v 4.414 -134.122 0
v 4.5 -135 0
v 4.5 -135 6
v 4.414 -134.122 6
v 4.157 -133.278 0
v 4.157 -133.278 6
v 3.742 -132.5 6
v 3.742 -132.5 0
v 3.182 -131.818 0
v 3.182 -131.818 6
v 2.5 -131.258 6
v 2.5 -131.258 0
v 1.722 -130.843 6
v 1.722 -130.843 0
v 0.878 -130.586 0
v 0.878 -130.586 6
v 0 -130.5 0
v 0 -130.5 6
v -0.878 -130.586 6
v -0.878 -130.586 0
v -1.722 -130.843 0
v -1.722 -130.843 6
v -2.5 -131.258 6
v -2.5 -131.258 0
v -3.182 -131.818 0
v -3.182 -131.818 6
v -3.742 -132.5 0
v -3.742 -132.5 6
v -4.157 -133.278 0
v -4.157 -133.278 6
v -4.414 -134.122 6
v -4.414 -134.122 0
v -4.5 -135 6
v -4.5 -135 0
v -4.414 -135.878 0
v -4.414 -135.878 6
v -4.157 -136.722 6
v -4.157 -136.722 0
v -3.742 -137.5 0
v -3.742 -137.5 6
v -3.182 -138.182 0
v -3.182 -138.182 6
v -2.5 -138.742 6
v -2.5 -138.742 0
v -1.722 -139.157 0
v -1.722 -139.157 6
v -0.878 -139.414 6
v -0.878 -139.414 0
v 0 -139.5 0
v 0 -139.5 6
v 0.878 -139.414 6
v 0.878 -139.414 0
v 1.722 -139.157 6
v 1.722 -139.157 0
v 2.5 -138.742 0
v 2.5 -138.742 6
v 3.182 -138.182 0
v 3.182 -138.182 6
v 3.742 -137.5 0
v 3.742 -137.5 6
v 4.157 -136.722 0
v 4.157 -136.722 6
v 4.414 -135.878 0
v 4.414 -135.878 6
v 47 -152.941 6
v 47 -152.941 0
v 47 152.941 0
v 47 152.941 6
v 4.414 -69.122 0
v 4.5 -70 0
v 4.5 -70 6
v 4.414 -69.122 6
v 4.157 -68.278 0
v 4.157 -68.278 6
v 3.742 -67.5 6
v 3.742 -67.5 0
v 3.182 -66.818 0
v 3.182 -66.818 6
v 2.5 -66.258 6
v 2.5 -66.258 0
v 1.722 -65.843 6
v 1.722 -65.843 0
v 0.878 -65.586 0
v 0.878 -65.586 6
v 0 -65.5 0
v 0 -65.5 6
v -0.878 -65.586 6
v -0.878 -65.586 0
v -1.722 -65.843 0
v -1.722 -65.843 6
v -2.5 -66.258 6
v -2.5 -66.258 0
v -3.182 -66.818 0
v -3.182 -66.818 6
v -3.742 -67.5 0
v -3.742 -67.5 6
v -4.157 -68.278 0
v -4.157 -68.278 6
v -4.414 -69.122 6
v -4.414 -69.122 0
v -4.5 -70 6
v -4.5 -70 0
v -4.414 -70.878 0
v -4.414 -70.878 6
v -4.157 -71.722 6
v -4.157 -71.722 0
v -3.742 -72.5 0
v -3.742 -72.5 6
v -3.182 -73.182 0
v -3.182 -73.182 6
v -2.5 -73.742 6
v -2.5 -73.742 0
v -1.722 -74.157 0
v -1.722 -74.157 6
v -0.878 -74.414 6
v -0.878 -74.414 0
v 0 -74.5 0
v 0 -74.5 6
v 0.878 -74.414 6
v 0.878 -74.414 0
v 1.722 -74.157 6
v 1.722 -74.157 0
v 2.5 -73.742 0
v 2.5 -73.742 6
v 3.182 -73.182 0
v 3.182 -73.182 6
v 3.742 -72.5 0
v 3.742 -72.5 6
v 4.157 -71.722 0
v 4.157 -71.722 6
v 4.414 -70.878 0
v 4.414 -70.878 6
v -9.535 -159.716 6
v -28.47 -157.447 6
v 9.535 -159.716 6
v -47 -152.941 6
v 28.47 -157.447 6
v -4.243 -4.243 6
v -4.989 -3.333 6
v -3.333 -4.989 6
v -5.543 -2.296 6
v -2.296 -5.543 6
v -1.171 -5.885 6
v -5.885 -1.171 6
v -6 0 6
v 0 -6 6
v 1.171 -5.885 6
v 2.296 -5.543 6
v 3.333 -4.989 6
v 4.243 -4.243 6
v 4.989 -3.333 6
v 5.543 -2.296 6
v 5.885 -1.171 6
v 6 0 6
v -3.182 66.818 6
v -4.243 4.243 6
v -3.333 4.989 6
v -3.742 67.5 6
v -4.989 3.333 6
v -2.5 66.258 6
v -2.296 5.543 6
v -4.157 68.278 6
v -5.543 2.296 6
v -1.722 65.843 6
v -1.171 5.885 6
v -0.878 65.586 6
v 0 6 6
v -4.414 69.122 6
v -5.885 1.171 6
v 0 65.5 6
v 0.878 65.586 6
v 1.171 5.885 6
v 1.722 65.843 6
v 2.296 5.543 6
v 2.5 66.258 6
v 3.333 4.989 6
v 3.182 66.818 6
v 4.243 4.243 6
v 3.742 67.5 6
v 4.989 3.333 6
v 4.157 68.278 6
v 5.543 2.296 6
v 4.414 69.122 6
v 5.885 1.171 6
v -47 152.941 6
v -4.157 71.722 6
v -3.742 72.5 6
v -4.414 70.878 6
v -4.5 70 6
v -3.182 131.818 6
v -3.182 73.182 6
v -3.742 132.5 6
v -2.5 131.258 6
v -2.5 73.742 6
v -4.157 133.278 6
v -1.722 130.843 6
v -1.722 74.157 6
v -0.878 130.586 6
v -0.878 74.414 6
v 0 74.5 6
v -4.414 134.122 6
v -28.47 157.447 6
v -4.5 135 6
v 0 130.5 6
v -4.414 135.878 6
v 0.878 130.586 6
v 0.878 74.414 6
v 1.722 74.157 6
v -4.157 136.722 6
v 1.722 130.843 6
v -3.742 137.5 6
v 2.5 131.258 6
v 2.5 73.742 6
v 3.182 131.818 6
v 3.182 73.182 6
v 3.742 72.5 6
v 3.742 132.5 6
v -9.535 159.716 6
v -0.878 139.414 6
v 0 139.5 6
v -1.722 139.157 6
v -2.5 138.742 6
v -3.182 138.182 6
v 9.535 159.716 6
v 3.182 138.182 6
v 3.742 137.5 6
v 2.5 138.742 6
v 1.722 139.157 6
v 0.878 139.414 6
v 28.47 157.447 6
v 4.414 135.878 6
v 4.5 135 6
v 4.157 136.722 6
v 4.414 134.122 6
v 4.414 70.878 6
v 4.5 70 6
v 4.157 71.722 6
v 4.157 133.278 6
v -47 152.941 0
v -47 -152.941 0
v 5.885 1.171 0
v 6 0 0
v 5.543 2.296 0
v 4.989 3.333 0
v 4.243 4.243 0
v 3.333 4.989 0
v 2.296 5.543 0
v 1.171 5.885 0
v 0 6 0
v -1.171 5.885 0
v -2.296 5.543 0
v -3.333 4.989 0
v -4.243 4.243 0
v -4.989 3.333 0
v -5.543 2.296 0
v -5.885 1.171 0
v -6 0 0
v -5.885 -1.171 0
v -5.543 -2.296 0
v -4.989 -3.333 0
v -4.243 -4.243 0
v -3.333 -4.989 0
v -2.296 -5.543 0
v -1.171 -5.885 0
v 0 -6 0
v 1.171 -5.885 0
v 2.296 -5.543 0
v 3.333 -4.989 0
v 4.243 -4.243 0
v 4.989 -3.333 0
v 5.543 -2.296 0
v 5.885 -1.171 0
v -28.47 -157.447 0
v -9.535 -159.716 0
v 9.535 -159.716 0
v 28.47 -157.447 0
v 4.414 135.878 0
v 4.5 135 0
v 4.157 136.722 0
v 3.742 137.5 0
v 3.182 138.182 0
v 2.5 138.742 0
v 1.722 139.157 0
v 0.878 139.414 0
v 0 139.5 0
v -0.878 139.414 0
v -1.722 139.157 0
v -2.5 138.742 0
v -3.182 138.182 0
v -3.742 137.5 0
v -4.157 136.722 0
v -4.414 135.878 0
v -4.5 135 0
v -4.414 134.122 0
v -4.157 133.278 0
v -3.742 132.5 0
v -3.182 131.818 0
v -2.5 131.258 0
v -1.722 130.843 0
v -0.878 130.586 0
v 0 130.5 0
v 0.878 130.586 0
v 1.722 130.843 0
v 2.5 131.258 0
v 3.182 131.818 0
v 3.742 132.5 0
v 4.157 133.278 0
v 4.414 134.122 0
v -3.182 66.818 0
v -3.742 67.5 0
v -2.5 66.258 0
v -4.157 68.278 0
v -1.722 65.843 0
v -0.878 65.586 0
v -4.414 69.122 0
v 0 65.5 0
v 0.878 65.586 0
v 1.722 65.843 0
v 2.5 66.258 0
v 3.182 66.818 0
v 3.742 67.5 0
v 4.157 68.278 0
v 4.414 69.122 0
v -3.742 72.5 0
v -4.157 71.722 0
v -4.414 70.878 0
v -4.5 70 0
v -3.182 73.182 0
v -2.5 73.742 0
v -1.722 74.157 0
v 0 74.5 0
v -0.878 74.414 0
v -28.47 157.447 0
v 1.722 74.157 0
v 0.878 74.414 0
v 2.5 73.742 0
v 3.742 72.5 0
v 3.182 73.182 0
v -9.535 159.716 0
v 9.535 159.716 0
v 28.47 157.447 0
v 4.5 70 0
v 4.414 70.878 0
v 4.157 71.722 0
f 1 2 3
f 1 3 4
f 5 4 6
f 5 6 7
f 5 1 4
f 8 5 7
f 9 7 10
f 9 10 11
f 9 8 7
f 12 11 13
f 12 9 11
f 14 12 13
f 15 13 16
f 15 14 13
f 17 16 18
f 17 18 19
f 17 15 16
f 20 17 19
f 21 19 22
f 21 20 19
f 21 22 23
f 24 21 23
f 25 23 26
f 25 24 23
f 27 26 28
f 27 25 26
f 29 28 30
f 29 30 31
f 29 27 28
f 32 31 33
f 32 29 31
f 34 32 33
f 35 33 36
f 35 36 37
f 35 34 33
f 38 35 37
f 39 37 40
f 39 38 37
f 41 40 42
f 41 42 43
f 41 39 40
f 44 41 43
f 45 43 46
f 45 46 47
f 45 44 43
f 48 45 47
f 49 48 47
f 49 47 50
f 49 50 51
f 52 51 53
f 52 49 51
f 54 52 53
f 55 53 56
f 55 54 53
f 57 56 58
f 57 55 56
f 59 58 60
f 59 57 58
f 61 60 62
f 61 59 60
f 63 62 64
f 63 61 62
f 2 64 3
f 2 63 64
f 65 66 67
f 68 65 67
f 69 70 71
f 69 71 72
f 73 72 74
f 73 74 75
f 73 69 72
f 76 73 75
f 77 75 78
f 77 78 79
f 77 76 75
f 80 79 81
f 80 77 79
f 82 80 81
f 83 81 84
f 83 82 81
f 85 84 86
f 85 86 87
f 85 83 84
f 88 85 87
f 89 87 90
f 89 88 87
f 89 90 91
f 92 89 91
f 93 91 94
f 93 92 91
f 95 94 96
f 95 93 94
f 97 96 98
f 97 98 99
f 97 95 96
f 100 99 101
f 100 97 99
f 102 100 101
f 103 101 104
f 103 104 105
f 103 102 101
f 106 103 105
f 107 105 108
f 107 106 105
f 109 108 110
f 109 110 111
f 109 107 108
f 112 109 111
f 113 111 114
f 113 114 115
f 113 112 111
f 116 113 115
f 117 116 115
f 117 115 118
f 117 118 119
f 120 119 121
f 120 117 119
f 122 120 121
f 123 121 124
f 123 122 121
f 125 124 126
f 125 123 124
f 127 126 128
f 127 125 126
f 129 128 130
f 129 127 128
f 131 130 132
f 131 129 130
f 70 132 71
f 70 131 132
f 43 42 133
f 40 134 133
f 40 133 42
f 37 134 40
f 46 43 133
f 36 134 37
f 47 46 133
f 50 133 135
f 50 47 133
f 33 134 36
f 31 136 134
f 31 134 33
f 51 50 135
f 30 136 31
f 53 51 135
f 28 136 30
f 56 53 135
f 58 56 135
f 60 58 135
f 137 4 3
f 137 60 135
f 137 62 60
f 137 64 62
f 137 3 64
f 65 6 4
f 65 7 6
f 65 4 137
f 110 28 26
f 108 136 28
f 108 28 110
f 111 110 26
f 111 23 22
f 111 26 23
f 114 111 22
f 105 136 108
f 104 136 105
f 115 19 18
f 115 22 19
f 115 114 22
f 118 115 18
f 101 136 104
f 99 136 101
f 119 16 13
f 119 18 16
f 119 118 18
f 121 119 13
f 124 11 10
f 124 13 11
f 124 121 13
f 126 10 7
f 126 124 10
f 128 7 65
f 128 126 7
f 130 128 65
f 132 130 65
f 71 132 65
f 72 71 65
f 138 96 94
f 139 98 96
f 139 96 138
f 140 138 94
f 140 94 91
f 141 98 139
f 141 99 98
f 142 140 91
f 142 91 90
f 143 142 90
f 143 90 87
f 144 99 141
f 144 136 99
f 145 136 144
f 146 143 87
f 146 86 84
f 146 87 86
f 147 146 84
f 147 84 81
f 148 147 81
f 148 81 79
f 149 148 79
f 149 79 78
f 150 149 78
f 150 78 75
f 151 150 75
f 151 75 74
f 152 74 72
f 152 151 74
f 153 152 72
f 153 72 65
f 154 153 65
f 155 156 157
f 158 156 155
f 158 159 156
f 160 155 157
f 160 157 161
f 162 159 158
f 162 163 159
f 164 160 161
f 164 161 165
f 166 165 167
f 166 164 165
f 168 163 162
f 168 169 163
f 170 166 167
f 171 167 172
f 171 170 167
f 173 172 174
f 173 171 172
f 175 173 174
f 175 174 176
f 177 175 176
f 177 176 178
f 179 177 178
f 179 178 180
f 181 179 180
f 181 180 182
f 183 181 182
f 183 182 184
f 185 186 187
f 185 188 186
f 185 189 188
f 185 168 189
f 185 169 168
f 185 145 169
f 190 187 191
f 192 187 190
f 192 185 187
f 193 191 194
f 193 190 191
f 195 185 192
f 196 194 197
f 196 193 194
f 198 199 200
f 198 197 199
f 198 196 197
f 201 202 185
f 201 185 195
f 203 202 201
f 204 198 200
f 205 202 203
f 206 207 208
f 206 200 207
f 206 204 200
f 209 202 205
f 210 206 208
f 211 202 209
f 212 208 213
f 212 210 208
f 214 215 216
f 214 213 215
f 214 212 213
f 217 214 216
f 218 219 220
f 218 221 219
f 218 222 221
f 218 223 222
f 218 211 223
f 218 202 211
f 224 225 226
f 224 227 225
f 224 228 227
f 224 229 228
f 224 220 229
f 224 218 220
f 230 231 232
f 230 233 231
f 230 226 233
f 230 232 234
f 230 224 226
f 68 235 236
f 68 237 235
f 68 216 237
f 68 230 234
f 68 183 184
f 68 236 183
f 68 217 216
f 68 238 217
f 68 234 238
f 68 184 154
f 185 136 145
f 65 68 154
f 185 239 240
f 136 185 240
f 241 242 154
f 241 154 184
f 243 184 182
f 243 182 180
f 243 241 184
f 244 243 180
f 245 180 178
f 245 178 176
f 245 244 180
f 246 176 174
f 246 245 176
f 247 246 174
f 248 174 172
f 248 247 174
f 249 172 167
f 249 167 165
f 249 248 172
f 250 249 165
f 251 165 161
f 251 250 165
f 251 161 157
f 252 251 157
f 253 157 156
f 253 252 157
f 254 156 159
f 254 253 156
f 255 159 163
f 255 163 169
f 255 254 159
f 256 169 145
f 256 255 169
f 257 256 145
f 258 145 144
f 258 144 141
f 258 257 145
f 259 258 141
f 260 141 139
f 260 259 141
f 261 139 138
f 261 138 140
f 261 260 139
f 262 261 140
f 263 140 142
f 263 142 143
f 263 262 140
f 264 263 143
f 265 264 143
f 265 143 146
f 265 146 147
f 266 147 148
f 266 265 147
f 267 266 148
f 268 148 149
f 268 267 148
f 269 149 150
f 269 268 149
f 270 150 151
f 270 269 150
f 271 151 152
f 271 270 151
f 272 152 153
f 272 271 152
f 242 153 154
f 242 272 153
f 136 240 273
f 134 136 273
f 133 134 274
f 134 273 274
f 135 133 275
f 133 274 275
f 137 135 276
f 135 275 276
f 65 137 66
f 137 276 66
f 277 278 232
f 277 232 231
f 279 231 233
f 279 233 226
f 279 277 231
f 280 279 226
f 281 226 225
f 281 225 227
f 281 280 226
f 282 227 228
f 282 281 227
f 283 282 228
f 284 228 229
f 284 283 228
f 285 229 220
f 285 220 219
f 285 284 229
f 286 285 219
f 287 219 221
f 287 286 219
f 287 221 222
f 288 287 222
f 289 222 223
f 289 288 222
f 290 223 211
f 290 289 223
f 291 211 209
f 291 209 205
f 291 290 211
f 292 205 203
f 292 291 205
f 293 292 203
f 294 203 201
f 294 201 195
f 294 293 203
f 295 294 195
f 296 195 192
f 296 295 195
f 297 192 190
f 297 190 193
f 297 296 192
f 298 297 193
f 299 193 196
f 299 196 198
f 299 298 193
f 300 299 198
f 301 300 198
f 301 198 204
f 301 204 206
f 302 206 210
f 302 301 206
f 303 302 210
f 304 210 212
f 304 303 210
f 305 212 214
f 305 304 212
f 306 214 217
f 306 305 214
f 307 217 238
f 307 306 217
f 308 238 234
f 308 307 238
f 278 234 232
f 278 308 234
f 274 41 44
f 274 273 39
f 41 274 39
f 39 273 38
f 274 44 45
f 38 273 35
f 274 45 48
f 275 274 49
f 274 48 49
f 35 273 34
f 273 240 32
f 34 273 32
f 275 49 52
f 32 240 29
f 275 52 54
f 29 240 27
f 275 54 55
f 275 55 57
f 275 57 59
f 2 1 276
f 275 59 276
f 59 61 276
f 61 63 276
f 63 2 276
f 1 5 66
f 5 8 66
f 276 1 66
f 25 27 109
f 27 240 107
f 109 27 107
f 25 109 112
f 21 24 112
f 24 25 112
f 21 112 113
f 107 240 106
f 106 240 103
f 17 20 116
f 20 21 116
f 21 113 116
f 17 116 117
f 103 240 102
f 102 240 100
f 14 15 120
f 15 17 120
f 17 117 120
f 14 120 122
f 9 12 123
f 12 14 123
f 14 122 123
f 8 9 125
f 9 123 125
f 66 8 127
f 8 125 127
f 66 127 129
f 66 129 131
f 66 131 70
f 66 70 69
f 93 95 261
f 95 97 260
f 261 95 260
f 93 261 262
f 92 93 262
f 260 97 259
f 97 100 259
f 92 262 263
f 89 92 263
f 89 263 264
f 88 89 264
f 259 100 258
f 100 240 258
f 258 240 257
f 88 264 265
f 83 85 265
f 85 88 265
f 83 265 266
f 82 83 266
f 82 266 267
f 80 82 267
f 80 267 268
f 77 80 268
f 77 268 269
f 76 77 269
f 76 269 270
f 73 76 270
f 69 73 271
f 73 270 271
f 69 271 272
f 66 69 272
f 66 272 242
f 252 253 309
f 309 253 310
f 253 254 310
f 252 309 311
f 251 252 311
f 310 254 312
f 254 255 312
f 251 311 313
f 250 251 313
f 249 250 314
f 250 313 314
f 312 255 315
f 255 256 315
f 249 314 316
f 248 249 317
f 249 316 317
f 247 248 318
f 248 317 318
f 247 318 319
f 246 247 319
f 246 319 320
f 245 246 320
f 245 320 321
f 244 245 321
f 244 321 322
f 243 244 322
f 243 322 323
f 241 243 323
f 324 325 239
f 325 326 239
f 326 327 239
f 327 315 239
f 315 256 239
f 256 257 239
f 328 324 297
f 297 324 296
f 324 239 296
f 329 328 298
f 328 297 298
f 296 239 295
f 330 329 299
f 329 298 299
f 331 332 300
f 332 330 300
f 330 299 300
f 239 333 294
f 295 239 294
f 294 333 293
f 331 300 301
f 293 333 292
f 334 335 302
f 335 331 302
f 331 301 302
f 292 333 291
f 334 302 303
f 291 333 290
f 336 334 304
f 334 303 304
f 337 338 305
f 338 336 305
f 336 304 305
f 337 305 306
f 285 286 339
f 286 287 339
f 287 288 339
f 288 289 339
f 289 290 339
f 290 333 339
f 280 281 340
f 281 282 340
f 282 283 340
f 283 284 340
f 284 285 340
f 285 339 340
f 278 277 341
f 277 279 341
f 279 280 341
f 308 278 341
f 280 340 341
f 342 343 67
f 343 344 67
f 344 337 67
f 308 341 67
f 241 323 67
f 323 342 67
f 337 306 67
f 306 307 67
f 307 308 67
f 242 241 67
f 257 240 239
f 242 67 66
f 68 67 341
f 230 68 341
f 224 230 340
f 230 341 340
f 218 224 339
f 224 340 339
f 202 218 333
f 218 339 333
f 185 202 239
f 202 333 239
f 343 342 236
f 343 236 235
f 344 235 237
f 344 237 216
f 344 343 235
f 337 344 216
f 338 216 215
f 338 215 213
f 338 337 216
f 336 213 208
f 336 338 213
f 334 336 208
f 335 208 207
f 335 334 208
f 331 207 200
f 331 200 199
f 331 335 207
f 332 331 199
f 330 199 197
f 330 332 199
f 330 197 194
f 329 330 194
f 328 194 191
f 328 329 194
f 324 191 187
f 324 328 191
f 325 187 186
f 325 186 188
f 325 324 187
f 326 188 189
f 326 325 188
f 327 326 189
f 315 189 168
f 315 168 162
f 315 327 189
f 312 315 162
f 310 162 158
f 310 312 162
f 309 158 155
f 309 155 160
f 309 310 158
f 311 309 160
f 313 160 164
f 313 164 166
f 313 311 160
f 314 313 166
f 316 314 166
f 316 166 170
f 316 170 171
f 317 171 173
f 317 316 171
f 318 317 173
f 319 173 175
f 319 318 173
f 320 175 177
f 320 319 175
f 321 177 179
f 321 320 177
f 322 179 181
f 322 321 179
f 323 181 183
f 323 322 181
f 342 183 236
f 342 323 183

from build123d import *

# Parameters (mm, degrees)
SZKIC1_R                    = 6
SZKIC1_R_2                  = 4.5
DODANIE_WYCI_GNI_CIE1_DEPTH = 6


with BuildPart() as part:
    # Szkic1 → Dodanie-wyciągnięcie1 (new body)
    with BuildSketch(Plane.XY):
        with BuildLine():
            Line((-47, 152.941165158), (-47, -152.941165158))
            ThreePointArc((-47, -152.941165158), (0, -160), (47, -152.941165158))
            Line((47, -152.941165158), (47, 152.941165158))
            ThreePointArc((47, 152.941165158), (0, 160), (-47, 152.941165158))
        make_face()
        Circle(SZKIC1_R, mode=Mode.SUBTRACT)
        with Locations((0, -70)):
            Circle(SZKIC1_R_2, mode=Mode.SUBTRACT)
        with Locations((0, 70)):
            Circle(SZKIC1_R_2, mode=Mode.SUBTRACT)
        with Locations((0, 135)):
            Circle(SZKIC1_R_2, mode=Mode.SUBTRACT)
        with Locations((0, -135)):
            Circle(SZKIC1_R_2, mode=Mode.SUBTRACT)
    extrude(amount=DODANIE_WYCI_GNI_CIE1_DEPTH)


solid = part.part
